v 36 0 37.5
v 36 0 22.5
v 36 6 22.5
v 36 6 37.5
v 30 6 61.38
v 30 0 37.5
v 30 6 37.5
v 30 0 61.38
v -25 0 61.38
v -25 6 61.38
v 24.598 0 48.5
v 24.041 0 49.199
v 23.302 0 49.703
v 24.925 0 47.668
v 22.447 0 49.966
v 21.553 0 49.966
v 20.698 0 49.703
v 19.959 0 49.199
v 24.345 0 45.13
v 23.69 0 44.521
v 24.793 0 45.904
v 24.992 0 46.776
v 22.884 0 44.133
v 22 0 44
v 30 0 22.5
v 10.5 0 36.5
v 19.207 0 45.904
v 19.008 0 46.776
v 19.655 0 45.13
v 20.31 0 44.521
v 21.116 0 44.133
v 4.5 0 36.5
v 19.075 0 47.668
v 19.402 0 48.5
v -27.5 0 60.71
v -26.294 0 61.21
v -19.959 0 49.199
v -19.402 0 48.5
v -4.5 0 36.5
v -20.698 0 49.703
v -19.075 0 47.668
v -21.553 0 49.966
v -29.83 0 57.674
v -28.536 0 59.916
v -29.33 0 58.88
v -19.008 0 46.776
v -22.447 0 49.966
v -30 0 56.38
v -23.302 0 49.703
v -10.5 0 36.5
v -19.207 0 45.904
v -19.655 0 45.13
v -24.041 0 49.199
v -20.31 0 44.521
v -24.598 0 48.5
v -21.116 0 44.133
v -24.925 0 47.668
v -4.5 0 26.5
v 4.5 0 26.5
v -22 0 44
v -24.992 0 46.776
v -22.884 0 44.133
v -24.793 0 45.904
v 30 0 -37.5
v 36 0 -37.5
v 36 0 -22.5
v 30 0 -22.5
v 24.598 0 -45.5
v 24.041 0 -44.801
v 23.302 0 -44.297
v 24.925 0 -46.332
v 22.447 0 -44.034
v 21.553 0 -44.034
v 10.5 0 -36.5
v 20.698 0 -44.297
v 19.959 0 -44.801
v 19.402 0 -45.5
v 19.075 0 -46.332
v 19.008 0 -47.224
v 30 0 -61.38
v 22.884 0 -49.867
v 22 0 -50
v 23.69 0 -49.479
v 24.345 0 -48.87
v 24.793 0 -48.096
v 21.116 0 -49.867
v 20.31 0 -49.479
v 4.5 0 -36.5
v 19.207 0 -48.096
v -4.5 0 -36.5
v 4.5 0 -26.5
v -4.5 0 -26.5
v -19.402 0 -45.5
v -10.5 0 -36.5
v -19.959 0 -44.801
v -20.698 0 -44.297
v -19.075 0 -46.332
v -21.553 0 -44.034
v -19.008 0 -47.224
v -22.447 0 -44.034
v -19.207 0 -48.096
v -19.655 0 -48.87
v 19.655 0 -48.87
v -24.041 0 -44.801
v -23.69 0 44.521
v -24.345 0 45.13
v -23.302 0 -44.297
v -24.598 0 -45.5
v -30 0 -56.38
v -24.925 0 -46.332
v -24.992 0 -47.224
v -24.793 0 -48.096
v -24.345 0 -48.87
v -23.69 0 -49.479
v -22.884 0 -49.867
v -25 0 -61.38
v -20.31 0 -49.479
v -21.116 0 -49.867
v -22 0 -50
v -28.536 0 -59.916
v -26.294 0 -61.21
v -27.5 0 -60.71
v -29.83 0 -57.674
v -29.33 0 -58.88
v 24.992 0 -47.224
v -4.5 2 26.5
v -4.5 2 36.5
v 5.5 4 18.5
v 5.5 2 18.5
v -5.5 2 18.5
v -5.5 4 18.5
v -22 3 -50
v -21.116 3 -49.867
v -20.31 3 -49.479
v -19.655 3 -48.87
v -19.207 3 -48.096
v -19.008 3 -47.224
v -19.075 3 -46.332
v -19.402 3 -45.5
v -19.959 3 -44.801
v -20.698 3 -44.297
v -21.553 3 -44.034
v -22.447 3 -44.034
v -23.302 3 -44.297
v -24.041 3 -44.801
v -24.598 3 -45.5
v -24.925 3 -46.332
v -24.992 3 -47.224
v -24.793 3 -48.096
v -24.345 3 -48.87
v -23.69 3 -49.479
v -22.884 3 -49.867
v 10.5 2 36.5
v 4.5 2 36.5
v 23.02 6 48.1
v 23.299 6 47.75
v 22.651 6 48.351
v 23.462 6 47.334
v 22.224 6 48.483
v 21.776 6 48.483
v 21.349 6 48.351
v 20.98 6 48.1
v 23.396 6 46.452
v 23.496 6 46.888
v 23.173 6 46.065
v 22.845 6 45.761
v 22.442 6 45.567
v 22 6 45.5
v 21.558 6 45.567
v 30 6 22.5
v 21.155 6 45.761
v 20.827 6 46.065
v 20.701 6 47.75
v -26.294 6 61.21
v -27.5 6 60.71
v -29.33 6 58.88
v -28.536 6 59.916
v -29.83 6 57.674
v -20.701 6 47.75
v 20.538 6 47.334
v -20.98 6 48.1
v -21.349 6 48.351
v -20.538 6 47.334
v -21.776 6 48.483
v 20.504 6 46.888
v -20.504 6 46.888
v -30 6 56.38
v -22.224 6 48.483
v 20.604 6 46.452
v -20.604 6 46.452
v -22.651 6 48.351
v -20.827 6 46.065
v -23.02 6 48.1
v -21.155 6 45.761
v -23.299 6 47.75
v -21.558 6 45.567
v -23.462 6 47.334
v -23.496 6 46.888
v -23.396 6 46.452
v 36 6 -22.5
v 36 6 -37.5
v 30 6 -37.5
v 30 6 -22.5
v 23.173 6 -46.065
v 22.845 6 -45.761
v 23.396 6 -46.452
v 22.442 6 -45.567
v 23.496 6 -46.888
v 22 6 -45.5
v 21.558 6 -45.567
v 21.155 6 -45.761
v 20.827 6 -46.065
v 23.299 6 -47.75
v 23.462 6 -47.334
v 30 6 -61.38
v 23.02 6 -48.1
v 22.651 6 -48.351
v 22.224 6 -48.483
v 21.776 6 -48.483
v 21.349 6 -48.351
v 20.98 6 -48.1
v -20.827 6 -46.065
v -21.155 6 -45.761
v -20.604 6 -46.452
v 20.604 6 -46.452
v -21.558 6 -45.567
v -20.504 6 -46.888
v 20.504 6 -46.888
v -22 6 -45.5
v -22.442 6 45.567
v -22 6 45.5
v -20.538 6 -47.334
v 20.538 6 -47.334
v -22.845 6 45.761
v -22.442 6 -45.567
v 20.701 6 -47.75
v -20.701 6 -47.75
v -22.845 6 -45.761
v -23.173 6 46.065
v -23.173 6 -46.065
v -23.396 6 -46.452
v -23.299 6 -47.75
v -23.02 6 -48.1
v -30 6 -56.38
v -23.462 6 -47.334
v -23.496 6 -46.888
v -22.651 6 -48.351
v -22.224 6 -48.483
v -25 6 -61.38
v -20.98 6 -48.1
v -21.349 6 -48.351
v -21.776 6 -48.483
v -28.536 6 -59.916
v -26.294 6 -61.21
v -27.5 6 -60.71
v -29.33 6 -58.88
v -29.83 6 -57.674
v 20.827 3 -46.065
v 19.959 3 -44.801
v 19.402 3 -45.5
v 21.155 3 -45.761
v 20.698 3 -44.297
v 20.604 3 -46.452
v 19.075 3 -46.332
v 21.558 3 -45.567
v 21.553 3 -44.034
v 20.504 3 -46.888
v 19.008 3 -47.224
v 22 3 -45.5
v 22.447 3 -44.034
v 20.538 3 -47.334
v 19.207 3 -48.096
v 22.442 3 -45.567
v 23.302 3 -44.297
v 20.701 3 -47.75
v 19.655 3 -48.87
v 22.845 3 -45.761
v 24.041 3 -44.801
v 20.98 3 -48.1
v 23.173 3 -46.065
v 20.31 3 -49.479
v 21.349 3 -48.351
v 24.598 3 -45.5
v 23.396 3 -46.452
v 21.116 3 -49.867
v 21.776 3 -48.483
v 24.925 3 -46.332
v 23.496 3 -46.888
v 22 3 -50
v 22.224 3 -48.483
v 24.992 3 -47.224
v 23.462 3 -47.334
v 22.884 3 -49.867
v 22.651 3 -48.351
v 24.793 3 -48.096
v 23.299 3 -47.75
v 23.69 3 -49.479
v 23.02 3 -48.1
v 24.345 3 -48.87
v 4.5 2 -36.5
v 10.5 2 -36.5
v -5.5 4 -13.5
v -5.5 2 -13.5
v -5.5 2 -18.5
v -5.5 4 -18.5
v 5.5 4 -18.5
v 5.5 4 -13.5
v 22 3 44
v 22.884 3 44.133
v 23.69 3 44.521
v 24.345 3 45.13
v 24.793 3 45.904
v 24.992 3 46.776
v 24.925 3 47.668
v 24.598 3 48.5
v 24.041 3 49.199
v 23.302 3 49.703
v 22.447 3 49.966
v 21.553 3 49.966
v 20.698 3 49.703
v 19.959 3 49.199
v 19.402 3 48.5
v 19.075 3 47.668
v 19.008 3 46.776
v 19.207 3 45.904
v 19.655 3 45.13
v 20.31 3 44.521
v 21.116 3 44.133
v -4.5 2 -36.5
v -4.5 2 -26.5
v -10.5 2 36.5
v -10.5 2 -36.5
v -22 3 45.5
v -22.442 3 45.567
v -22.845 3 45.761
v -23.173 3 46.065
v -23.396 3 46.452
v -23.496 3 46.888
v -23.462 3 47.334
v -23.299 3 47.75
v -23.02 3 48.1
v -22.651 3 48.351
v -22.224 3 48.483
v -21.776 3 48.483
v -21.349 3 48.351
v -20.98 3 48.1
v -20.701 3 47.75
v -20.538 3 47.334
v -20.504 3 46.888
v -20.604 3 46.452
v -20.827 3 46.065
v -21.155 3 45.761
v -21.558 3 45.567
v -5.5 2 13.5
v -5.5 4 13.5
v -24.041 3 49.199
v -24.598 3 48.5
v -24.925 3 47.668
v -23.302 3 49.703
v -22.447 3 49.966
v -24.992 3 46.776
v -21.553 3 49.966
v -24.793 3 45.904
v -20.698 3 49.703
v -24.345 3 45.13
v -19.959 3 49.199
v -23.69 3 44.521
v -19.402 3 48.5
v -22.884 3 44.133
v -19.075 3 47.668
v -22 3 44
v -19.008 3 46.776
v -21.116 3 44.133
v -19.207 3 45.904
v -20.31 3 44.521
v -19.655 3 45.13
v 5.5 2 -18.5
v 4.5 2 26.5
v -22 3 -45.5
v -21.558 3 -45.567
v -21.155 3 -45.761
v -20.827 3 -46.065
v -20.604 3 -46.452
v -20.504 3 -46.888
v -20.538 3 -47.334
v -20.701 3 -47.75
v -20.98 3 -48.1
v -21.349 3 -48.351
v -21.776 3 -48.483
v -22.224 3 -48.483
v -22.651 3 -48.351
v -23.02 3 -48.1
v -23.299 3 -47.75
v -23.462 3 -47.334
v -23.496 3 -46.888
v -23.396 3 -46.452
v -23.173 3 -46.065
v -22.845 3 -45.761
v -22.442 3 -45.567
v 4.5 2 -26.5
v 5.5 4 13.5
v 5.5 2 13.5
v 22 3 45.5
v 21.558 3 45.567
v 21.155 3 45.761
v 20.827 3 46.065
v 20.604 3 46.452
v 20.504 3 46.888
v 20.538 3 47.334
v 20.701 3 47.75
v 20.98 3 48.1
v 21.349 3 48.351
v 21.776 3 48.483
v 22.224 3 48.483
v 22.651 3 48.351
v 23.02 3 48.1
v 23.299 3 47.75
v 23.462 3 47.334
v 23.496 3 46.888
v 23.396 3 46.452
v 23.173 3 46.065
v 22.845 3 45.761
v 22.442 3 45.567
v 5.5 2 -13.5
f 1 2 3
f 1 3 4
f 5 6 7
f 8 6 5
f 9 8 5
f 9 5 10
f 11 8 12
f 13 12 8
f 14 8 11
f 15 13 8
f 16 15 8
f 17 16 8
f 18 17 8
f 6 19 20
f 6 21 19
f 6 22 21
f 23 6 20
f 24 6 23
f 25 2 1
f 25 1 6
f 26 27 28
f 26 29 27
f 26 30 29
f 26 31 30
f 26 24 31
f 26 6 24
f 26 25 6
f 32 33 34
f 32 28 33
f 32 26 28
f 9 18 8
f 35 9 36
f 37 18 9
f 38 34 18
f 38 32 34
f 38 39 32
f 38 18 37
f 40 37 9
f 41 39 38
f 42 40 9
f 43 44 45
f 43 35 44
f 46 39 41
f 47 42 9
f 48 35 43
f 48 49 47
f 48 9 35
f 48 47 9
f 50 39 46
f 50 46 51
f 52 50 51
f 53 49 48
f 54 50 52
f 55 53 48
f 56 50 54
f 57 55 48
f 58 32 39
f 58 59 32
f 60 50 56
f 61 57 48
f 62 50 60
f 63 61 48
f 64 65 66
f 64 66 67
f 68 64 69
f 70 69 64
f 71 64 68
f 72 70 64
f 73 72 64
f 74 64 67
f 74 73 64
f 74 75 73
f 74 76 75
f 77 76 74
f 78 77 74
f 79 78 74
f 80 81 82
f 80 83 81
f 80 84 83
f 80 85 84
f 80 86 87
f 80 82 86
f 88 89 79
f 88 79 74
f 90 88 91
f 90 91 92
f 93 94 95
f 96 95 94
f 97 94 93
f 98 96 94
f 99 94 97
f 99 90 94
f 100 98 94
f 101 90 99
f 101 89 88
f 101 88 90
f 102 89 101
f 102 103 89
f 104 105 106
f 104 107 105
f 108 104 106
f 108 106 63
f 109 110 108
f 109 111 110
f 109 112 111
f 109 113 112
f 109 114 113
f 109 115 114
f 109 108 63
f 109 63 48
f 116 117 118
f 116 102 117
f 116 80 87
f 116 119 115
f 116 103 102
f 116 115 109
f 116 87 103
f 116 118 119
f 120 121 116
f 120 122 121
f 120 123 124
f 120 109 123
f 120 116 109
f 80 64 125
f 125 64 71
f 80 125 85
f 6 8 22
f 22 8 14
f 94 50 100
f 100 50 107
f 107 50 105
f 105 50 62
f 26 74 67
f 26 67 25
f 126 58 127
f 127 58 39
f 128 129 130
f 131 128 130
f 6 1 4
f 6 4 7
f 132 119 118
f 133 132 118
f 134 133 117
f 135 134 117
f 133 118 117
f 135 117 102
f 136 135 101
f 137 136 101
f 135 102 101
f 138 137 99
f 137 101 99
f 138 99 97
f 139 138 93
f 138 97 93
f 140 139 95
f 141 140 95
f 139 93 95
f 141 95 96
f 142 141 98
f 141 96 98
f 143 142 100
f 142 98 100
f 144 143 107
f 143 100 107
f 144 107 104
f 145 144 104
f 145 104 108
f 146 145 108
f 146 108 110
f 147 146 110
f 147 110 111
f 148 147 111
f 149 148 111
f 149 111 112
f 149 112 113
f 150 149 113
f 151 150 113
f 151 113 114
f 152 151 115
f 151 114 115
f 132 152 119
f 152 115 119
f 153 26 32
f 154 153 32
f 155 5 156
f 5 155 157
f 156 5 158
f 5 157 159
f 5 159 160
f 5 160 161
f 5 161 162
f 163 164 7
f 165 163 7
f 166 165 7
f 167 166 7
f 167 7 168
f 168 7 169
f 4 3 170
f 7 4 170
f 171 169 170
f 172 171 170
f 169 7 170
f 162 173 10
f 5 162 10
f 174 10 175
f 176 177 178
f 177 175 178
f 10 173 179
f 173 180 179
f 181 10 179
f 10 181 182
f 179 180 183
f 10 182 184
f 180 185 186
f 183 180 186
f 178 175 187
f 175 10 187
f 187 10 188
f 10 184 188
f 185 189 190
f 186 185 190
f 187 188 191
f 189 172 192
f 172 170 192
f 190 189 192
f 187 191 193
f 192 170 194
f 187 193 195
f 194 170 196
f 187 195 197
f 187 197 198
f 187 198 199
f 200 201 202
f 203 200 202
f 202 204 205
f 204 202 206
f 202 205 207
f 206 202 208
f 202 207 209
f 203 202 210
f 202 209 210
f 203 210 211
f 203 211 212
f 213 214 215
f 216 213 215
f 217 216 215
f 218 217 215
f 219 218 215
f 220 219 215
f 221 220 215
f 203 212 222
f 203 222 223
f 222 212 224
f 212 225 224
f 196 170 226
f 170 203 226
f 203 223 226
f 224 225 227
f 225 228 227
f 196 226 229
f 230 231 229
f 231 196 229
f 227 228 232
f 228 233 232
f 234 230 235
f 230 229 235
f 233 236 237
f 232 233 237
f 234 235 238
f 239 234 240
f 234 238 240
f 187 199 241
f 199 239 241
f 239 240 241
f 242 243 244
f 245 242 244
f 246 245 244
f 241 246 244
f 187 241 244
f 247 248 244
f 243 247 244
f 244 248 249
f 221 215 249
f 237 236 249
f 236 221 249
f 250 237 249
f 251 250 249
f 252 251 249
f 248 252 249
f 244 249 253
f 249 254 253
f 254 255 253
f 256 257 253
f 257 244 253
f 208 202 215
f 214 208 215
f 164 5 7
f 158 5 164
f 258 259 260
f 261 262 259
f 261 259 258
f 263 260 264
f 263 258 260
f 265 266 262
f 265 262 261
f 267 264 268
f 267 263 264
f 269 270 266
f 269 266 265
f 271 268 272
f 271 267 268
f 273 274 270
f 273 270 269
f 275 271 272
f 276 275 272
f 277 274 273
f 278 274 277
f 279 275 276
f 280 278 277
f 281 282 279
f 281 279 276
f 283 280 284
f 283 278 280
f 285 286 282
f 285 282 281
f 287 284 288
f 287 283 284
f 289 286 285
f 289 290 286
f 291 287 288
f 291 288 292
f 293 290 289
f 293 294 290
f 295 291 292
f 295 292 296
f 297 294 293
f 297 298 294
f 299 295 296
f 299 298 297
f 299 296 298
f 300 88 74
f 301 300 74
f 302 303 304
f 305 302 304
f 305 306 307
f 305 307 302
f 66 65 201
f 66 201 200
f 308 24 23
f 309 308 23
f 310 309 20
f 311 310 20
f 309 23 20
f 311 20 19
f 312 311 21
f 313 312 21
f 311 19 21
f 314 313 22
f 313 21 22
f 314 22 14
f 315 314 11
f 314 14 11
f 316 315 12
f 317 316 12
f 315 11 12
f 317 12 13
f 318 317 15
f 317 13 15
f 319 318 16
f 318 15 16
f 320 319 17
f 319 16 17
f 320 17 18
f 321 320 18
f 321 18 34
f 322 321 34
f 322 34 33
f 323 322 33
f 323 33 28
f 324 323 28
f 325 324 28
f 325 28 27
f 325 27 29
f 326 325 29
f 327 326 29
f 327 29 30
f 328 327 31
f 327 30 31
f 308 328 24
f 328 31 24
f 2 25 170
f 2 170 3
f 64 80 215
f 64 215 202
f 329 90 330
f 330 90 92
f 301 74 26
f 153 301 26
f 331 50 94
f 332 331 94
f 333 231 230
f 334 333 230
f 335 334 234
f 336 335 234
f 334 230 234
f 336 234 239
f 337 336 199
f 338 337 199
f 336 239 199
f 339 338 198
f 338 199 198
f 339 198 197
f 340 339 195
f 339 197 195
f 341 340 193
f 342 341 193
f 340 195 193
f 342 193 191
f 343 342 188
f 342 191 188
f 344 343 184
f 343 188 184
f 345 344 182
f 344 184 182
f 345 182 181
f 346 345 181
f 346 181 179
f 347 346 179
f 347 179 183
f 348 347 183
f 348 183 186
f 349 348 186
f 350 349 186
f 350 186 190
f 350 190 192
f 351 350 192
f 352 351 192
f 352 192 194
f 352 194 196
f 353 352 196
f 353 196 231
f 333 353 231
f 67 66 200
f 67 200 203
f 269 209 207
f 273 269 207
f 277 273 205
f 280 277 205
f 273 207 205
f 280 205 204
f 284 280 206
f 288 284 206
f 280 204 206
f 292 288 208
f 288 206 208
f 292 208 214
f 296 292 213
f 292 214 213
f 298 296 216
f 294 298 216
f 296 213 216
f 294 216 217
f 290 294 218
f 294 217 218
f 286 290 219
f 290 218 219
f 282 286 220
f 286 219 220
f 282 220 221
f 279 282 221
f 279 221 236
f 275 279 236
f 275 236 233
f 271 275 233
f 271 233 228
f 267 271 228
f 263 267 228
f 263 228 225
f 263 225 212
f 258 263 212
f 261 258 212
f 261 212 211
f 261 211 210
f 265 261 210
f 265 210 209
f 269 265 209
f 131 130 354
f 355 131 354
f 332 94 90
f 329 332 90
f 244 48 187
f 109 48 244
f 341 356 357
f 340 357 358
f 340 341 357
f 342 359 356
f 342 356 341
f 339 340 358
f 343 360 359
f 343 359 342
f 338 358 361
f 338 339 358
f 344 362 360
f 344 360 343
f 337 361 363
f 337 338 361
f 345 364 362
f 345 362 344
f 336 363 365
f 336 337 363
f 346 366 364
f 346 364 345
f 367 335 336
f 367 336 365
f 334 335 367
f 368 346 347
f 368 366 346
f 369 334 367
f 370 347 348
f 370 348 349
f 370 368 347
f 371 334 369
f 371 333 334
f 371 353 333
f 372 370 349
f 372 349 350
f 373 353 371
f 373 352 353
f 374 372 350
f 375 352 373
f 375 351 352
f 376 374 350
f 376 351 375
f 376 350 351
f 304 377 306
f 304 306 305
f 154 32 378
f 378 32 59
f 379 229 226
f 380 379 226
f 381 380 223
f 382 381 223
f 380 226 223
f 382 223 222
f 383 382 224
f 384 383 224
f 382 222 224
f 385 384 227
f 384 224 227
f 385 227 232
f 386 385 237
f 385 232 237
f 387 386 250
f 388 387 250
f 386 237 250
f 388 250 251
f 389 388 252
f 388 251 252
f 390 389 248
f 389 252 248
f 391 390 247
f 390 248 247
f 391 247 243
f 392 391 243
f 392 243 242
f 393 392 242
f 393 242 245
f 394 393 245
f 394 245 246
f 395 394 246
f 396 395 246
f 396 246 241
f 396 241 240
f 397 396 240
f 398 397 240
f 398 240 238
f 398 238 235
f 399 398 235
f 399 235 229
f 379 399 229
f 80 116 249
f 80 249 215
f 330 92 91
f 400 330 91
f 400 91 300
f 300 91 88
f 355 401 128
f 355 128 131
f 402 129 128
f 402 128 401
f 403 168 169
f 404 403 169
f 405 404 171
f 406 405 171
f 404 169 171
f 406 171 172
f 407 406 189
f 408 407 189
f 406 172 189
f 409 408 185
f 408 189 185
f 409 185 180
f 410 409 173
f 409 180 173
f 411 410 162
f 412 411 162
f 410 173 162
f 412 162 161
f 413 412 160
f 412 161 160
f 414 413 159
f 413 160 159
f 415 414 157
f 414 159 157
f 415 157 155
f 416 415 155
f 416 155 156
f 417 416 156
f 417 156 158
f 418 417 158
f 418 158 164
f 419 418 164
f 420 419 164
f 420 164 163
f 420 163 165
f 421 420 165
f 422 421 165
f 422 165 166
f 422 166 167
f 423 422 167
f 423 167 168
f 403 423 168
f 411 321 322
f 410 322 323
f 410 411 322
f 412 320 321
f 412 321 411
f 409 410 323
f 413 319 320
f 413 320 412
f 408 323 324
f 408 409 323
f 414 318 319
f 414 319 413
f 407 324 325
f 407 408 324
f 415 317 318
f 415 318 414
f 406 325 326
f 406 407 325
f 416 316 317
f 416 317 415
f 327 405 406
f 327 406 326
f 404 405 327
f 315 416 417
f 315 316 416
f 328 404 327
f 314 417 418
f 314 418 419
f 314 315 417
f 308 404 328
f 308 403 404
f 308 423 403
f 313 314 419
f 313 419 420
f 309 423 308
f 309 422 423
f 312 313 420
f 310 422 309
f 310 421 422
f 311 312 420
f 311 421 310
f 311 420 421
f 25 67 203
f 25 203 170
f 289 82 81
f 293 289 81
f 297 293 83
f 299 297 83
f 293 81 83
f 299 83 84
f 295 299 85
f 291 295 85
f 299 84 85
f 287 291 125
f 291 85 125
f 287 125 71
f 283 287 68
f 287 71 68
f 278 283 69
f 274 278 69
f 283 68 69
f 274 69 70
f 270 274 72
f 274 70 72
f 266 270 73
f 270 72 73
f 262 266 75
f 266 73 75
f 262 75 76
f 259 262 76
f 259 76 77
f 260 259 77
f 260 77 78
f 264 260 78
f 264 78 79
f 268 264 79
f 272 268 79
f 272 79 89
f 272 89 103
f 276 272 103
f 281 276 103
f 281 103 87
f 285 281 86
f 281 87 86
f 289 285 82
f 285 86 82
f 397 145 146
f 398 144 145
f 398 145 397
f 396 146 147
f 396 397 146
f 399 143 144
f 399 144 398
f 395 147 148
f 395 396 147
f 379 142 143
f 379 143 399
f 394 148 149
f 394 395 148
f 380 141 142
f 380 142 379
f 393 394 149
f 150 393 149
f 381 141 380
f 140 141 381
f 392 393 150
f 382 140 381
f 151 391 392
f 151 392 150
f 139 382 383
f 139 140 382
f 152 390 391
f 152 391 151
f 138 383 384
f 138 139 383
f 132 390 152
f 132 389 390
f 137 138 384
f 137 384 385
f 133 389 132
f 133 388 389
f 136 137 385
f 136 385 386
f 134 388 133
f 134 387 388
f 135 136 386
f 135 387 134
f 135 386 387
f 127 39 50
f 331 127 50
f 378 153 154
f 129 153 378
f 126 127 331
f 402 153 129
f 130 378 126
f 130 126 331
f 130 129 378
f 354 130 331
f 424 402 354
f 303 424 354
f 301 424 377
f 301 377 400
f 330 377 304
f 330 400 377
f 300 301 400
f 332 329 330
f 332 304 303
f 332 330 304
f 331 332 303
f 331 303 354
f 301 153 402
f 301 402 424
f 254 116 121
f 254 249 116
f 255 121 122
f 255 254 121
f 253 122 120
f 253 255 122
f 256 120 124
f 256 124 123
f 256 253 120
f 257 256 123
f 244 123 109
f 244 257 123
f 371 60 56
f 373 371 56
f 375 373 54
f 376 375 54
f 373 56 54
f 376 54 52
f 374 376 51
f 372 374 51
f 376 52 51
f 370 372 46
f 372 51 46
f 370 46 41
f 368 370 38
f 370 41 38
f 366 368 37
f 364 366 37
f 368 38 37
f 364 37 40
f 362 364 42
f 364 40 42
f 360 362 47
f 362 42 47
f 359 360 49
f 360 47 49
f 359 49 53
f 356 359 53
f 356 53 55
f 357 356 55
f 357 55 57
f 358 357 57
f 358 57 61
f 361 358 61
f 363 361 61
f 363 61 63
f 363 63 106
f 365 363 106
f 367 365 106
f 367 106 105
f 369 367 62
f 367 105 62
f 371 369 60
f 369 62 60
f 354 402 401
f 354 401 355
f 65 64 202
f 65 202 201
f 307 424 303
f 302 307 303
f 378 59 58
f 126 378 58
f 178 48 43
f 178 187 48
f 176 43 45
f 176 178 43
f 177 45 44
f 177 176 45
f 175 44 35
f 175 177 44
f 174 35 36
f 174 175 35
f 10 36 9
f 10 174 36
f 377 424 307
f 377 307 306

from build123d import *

# Parameters (mm, degrees)
BOSS_EXTRU_1_DEPTH      = 6
ESQUISSE3_R             = 1.5
ENL_V_MAT_EXTRU_1_DEPTH = 6
CONG_1_R                = 5
ESQUISSE6_R             = 3
ENL_V_MAT_EXTRU_2_DEPTH = 3
ENL_V_MAT_EXTRU_3_DEPTH = 2
ESQUISSE8_W             = 11
ESQUISSE8_H             = 5
ENL_V_MAT_EXTRU_4_DEPTH = 2


with BuildPart() as part:
    # Esquisse1 → Boss.-Extru.1 (new body)
    with BuildSketch(Plane(origin=(0, 0, 0), x_dir=(1, 0, 0), z_dir=(0, 1, 0))):
        Polygon((-30, 61.38), (30, 61.38), (30, 37.5), (36, 37.5), (36, 22.5), (30, 22.5), (30, -22.5), (36, -22.5), (36, -37.5), (30, -37.5), (30, -61.38), (-30, -61.38), align=None)
    extrude(amount=BOSS_EXTRU_1_DEPTH)

    # Esquisse3 → Enlèv. mat.-Extru.1 (cut)
    with BuildSketch(Plane(origin=(0, 6, 0), x_dir=(1, 0, 0), z_dir=(0, 1, 0))):
        with Locations(Location((22, 47, 0), (0, 0, 270))):
            Circle(ESQUISSE3_R)
        with Locations(Location((-22, 47, 0), (0, 0, 270))):
            Circle(ESQUISSE3_R)
        with Locations(Location((-22, -47, 0), (0, 0, 90))):
            Circle(ESQUISSE3_R)
        with Locations(Location((22, -47, 0), (0, 0, 90))):
            Circle(ESQUISSE3_R)
    extrude(amount=-ENL_V_MAT_EXTRU_1_DEPTH, mode=Mode.SUBTRACT)

    # Congé1
    cong_1_edges = [part.edges().sort_by_distance(p)[0] for p in [
        (-30, 3, -61.38),
        (-30, 3, 61.38),
    ]]
    fillet(cong_1_edges, radius=CONG_1_R)

    # Esquisse6 → Enlèv. mat.-Extru.2 (cut)
    with BuildSketch(Plane.XZ):
        with Locations(Location((22, 47, 0), (0, 0, 270))):
            Circle(ESQUISSE6_R)
        with Locations(Location((-22, 47, 0), (0, 0, 270))):
            Circle(ESQUISSE6_R)
        with Locations(Location((22, -47, 0), (0, 0, 270))):
            Circle(ESQUISSE6_R)
        with Locations(Location((-22, -47, 0), (0, 0, 270))):
            Circle(ESQUISSE6_R)
    extrude(amount=-ENL_V_MAT_EXTRU_2_DEPTH, mode=Mode.SUBTRACT)

    # Esquisse7 → Enlèv. mat.-Extru.3 (cut)
    with BuildSketch(Plane(origin=(0, 0, 0), x_dir=(-1, 0, 0), z_dir=(0, -1, 0))):
        Polygon((10.5, -36.5), (10.5, 36.5), (4.5, 36.5), (4.5, 26.5), (-4.5, 26.5), (-4.5, 36.5), (-10.5, 36.5), (-10.5, -36.5), (-4.5, -36.5), (-4.5, -26.5), (4.5, -26.5), (4.5, -36.5), align=None)
    extrude(amount=-ENL_V_MAT_EXTRU_3_DEPTH, mode=Mode.SUBTRACT)

    # Esquisse8 → Enlèv. mat.-Extru.4 (cut)
    with BuildSketch(Plane(origin=(0, 2, 0), x_dir=(-1, 0, 0), z_dir=(0, -1, 0))):
        with Locations((0, -16)):
            Rectangle(ESQUISSE8_W, ESQUISSE8_H)
        with Locations((0, 16)):
            Rectangle(ESQUISSE8_W, ESQUISSE8_H)
    extrude(amount=-ENL_V_MAT_EXTRU_4_DEPTH, mode=Mode.SUBTRACT)


solid = part.part
